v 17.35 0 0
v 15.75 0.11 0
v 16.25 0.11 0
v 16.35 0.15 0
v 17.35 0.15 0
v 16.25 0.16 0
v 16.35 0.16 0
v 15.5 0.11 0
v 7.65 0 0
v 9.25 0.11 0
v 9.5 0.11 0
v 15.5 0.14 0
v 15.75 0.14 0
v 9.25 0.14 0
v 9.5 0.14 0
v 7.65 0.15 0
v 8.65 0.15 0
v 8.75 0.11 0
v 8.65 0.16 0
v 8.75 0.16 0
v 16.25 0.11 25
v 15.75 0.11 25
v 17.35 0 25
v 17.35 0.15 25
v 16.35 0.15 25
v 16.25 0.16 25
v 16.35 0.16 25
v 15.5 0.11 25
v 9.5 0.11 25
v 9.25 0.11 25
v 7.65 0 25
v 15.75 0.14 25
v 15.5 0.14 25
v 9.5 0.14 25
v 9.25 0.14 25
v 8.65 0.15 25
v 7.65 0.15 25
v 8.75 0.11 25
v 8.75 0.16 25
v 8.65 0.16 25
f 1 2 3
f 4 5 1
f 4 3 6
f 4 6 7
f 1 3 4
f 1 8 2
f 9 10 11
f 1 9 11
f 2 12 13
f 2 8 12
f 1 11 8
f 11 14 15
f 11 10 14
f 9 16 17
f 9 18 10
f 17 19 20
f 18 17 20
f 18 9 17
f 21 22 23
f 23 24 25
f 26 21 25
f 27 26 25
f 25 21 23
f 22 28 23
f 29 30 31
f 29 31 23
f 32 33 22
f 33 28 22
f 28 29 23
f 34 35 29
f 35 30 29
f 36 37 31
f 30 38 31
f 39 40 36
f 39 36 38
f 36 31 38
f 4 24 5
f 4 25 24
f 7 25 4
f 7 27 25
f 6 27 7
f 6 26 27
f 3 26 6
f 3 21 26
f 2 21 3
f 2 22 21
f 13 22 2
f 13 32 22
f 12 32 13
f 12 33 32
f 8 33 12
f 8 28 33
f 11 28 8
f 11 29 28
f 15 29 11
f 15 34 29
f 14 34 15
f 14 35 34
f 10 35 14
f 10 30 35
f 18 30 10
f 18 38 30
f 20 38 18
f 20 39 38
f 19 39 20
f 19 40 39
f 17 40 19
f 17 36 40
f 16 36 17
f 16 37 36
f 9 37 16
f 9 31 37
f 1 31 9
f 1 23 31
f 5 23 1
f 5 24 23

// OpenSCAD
//general
meter = 1;
cm = meter / 100;

module generateStreetProfile(total_width, line_width, line_left_amount, line_right_amount, sidewalk_width, sidewalk_right, sidewalk_left, bike_width, bike_left, bike_right, bike_seperator_width, bike_seperator_left_amount, bike_seperator_right_amount, curb_width, curb_left, curb_right, gen_h) {
    // Predefined values (changable)
    meter = 1;
    cm = meter / 100;
    infinite = 1 * total_width;
    sidewalk_height = gen_h * 3 / 4;
    curb_height = sidewalk_height + 1 * cm;
    road_height = curb_height - 5 * cm;
    bike_seperator_height = road_height + 3 * cm;
    bike_height = road_height;

    // Magic calculations
    line_location = 1/2 * total_width - line_width * line_left_amount;
    line_totalwidth = line_width * (line_left_amount + line_right_amount);
    bike_seperator_totalwidth = bike_seperator_width * (bike_seperator_left_amount + bike_seperator_right_amount) + line_totalwidth;
    bike_seperator_location = line_location - bike_seperator_left_amount * bike_seperator_width;
    bike_totalwidth = bike_width * (bike_left + bike_right) + bike_seperator_totalwidth;
    bike_location = bike_seperator_location - bike_width * bike_left;
    curb_totalwidth = (curb_left+curb_right) * curb_width + bike_totalwidth;
    curb_location = bike_location - curb_width * curb_left;
    sidewalk_totalwidth = (sidewalk_right + sidewalk_left) * sidewalk_width + curb_totalwidth;
    sidewalk_location = curb_location - sidewalk_width * sidewalk_left;

    difference() {
        // Generating the raw street from width
        square([total_width, gen_h]);
    
        // Driving lane
        translate([line_location, road_height, 0]) {
            square([line_totalwidth, infinite]);
        }
    
        // Bike separator
        translate([bike_seperator_location, bike_seperator_height, 0]) {
            square([bike_seperator_totalwidth, infinite]);
        }
    
        // Bike lane left / right
        difference() {
            translate([bike_location, bike_height, 0]) {
                square([bike_totalwidth, infinite]);
            }
            // Exclude the bike separator out of the two
            translate([bike_seperator_location, 0, 0]) {
                square([bike_seperator_totalwidth, infinite]);
            }
        }
    
        // Curb
        translate([curb_location, curb_height, 0]) {
            square([curb_totalwidth, infinite]);
        }

        // Sidewalk
        difference() {
            translate([sidewalk_location, sidewalk_height, 0]) {
                square([sidewalk_totalwidth, infinite]);
            }
        
            // Curb
            translate([curb_location, 0, 0]) {
                square([curb_totalwidth, infinite]);
            }
        }
        
        //remove rest
        difference() {
            square([total_width, infinite]);
            translate([sidewalk_location, 0, 0]) {
                square([sidewalk_totalwidth, infinite]);
            }
        }
    }
}



linear_extrude(height = 25*meter) {
    // Example usage of the function
    generateStreetProfile(
        25 * meter, // total_width
        3 * meter,  // line_width
        1,          // line_left_amount
        1,          // line_right_amount
        1 * meter,  // sidewalk_width
        1,          // sidewalk_right
        1,          // sidewalk_left
        1/2 * meter, // bike_width
        1,          // bike_left
        1,          // bike_right
        1/4 * meter, // bike_seperator_width
        1,          // bike_seperator_left_amount
        1,          // bike_seperator_right_amount
        10 * cm,     // curb_width
        1,          //curb_left
        1,          //curb_right
        20 * cm     // gen_h
    );
}
